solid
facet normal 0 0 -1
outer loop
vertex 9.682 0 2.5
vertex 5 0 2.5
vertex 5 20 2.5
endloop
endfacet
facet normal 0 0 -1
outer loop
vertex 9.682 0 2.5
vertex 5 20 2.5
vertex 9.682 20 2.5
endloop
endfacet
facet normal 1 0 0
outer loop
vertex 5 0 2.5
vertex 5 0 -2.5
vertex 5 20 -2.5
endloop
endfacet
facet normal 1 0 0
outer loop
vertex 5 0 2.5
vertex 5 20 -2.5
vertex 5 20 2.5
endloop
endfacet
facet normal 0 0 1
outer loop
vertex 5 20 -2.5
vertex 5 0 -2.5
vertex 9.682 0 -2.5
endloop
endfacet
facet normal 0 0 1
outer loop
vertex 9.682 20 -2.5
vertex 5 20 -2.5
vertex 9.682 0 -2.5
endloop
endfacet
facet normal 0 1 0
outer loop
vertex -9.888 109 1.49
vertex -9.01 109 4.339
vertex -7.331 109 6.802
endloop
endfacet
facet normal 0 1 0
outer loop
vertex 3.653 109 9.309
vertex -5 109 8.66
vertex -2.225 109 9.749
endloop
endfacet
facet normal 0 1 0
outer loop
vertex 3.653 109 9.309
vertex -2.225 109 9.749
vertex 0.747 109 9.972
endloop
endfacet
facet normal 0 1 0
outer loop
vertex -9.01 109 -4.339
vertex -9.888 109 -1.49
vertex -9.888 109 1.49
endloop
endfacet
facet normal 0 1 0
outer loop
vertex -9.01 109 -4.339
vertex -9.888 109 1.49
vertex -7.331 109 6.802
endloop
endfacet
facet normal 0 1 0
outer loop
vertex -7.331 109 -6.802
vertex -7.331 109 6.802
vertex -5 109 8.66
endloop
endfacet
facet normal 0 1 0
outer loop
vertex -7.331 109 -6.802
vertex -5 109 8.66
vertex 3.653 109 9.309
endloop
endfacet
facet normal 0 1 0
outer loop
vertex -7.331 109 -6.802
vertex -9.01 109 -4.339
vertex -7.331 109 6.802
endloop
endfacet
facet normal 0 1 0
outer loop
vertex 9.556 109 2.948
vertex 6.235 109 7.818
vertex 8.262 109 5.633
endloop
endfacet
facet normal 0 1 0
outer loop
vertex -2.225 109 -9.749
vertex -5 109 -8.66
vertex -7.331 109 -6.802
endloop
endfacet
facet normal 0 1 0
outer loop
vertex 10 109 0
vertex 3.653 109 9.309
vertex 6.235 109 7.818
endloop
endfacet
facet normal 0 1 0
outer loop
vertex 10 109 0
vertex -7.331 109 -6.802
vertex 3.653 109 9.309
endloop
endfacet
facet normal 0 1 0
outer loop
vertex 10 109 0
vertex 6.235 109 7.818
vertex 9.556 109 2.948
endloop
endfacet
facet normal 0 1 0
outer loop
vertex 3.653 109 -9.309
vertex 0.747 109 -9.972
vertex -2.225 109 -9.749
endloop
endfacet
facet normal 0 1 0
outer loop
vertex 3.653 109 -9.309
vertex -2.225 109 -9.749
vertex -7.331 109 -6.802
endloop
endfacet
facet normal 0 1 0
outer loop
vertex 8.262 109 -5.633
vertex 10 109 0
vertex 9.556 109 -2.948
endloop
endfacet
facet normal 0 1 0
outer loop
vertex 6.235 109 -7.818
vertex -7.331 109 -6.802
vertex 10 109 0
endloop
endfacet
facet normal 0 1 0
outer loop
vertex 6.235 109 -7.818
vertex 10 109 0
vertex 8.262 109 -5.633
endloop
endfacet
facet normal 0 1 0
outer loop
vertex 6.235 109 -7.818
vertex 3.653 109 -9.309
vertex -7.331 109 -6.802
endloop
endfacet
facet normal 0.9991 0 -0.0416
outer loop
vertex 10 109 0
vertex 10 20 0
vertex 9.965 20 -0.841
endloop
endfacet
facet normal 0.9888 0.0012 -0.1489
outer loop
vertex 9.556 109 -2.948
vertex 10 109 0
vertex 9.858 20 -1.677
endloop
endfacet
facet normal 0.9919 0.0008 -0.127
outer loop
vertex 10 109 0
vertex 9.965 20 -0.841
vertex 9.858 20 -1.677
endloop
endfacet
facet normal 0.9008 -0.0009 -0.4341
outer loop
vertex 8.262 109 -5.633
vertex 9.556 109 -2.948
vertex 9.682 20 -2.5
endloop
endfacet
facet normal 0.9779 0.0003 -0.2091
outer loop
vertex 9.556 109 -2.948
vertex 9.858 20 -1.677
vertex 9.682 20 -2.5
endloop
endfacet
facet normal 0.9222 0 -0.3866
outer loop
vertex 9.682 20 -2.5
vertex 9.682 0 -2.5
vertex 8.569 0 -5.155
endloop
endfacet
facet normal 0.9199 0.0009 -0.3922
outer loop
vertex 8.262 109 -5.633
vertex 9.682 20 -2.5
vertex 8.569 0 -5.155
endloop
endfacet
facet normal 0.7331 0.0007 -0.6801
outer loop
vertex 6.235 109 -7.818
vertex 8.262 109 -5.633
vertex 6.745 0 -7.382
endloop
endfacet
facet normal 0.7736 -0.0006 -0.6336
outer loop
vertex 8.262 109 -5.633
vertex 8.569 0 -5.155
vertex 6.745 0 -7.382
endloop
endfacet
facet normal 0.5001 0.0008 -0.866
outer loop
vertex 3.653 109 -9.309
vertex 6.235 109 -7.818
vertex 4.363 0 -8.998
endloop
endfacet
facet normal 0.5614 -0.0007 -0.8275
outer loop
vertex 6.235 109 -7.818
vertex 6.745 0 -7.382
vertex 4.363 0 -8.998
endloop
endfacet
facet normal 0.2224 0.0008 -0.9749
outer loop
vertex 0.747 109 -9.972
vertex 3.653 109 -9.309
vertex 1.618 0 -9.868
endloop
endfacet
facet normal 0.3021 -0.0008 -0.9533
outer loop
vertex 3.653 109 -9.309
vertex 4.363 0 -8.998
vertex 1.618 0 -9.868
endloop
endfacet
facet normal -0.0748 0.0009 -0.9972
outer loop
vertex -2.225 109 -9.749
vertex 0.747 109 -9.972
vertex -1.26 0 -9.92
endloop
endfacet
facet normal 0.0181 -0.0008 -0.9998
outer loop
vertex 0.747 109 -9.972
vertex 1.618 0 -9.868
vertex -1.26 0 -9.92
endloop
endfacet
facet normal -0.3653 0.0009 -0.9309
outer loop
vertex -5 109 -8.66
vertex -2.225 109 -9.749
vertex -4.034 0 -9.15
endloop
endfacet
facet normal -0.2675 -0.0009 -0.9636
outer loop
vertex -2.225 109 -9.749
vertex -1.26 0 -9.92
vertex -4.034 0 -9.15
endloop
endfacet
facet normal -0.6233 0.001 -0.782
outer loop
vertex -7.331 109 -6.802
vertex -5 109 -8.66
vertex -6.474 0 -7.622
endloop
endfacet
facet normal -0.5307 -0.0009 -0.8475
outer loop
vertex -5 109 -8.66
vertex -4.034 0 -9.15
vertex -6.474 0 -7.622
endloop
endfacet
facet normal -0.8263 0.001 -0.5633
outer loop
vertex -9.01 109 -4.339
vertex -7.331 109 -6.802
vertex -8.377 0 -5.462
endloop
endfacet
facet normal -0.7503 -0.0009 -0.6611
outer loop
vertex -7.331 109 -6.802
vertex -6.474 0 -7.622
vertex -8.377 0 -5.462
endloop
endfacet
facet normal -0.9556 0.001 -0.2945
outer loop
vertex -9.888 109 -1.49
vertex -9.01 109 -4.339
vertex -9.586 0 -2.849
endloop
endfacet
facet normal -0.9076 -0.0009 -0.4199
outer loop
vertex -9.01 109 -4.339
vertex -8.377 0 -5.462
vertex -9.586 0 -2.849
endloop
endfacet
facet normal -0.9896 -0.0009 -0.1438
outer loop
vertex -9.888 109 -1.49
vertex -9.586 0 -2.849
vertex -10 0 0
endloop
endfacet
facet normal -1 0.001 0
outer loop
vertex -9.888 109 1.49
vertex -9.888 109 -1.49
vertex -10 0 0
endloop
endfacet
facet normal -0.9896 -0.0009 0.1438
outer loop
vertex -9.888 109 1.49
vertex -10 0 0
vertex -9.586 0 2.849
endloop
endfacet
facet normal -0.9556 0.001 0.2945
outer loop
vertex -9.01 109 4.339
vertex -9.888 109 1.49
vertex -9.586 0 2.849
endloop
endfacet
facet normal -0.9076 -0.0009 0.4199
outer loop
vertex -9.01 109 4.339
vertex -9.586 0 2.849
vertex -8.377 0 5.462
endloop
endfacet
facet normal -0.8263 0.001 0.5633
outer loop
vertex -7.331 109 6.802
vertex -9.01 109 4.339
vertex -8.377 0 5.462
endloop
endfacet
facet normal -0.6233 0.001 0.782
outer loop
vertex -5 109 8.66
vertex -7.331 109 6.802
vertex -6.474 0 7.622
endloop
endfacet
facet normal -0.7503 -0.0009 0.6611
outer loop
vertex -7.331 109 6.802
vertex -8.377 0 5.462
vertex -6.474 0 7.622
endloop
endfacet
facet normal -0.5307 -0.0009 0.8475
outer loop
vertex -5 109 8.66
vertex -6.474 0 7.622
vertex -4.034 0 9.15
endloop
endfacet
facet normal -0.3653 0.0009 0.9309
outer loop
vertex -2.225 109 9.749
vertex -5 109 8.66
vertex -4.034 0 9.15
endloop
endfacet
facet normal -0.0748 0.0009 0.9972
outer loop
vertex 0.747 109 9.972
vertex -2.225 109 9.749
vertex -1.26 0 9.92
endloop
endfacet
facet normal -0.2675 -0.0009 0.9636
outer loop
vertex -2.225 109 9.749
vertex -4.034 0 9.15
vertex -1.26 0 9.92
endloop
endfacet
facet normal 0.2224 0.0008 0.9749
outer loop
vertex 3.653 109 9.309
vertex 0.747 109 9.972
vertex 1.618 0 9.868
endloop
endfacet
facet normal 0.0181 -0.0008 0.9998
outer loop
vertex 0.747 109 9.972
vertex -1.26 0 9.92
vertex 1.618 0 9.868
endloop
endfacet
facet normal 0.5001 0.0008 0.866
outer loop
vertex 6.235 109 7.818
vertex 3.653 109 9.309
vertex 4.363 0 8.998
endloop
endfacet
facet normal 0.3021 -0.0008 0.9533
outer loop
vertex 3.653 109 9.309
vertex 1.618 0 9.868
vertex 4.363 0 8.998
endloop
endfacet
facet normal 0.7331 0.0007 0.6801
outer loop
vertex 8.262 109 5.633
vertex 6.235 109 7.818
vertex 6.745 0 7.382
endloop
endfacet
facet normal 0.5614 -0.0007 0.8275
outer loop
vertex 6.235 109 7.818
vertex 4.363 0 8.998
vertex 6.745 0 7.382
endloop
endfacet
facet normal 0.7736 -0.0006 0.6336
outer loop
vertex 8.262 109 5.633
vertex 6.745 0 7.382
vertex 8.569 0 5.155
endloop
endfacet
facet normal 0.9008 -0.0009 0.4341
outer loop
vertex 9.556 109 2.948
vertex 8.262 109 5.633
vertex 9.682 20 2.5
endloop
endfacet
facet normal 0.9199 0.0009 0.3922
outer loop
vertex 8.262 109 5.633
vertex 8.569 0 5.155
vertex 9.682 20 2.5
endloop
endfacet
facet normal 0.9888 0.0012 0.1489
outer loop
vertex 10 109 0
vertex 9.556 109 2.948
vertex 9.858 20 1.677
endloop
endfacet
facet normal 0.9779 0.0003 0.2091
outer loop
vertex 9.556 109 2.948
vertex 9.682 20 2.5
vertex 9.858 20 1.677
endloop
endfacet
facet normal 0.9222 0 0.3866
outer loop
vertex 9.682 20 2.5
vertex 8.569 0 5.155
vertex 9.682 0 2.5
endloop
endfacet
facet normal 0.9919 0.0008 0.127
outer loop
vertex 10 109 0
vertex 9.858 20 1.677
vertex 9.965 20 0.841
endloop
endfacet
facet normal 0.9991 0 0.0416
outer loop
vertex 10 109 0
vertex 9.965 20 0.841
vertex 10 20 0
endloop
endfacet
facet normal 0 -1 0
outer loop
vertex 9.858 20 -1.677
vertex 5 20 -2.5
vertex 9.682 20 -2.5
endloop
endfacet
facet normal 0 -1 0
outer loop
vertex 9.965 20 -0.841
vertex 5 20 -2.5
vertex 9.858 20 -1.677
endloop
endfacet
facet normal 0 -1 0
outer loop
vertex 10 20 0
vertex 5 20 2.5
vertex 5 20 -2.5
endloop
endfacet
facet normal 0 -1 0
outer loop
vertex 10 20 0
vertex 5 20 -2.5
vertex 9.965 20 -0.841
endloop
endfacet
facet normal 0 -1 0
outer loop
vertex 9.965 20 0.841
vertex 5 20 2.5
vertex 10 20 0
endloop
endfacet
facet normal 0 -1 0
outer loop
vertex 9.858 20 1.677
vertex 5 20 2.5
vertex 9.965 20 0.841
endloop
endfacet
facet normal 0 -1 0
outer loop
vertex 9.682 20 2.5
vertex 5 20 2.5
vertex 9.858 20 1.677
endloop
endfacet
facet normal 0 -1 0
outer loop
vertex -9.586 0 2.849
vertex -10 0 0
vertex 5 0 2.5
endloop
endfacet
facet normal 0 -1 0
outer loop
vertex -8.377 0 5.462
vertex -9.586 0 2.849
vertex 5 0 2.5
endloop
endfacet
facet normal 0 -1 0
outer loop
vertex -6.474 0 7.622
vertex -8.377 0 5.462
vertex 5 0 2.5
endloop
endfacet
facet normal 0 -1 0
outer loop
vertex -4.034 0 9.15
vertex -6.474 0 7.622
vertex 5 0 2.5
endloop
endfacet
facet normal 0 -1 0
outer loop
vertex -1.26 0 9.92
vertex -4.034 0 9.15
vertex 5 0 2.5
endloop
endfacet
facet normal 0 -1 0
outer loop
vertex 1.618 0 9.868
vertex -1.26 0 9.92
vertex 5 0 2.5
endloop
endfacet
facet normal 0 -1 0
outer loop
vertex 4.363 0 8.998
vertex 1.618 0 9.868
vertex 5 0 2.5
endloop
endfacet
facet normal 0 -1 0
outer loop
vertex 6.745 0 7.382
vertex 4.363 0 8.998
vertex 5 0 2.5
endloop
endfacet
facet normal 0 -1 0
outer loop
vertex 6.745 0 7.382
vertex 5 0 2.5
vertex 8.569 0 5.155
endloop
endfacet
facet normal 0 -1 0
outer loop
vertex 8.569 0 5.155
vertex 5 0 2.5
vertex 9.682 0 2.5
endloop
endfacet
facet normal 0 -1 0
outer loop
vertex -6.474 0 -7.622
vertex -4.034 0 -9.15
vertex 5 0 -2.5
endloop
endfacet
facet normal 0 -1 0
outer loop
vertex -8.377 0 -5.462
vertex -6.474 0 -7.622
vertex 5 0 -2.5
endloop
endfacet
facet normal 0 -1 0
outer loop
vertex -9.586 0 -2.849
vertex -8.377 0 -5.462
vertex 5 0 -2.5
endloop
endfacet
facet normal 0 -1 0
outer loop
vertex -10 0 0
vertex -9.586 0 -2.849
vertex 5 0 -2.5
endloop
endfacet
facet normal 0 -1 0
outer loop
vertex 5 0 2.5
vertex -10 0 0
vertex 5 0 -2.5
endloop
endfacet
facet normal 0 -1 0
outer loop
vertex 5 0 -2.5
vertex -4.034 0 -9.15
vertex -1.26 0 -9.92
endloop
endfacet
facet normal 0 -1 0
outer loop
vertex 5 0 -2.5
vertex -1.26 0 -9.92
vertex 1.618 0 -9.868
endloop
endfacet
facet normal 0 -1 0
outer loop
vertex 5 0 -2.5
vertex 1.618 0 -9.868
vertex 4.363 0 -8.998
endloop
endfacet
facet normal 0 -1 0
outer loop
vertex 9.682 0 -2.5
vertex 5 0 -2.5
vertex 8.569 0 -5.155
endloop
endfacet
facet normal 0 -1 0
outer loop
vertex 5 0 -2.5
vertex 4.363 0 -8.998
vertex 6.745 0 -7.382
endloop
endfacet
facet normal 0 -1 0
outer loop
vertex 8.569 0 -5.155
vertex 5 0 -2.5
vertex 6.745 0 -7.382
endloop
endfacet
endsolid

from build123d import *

# Parameters (mm, degrees)
SKETCH1_R           = 10
BOSS_EXTRUDE2_DEPTH = 109
SKETCH3_W           = 10
SKETCH3_H           = 5
CUT_EXTRUDE1_DEPTH  = 20


with BuildPart() as part:
    # Sketch1 → Boss-Extrude2 (new body)
    with BuildSketch(Plane(origin=(0, 0, 0), x_dir=(1, 0, 0), z_dir=(0, 1, 0))):
        Circle(SKETCH1_R)
    extrude(amount=BOSS_EXTRUDE2_DEPTH)

    # Sketch3 → Cut-Extrude1 (cut)
    with BuildSketch(Plane.XZ):
        with Locations((10, 0)):
            Rectangle(SKETCH3_W, SKETCH3_H)
    extrude(amount=-CUT_EXTRUDE1_DEPTH, mode=Mode.SUBTRACT)


solid = part.part
